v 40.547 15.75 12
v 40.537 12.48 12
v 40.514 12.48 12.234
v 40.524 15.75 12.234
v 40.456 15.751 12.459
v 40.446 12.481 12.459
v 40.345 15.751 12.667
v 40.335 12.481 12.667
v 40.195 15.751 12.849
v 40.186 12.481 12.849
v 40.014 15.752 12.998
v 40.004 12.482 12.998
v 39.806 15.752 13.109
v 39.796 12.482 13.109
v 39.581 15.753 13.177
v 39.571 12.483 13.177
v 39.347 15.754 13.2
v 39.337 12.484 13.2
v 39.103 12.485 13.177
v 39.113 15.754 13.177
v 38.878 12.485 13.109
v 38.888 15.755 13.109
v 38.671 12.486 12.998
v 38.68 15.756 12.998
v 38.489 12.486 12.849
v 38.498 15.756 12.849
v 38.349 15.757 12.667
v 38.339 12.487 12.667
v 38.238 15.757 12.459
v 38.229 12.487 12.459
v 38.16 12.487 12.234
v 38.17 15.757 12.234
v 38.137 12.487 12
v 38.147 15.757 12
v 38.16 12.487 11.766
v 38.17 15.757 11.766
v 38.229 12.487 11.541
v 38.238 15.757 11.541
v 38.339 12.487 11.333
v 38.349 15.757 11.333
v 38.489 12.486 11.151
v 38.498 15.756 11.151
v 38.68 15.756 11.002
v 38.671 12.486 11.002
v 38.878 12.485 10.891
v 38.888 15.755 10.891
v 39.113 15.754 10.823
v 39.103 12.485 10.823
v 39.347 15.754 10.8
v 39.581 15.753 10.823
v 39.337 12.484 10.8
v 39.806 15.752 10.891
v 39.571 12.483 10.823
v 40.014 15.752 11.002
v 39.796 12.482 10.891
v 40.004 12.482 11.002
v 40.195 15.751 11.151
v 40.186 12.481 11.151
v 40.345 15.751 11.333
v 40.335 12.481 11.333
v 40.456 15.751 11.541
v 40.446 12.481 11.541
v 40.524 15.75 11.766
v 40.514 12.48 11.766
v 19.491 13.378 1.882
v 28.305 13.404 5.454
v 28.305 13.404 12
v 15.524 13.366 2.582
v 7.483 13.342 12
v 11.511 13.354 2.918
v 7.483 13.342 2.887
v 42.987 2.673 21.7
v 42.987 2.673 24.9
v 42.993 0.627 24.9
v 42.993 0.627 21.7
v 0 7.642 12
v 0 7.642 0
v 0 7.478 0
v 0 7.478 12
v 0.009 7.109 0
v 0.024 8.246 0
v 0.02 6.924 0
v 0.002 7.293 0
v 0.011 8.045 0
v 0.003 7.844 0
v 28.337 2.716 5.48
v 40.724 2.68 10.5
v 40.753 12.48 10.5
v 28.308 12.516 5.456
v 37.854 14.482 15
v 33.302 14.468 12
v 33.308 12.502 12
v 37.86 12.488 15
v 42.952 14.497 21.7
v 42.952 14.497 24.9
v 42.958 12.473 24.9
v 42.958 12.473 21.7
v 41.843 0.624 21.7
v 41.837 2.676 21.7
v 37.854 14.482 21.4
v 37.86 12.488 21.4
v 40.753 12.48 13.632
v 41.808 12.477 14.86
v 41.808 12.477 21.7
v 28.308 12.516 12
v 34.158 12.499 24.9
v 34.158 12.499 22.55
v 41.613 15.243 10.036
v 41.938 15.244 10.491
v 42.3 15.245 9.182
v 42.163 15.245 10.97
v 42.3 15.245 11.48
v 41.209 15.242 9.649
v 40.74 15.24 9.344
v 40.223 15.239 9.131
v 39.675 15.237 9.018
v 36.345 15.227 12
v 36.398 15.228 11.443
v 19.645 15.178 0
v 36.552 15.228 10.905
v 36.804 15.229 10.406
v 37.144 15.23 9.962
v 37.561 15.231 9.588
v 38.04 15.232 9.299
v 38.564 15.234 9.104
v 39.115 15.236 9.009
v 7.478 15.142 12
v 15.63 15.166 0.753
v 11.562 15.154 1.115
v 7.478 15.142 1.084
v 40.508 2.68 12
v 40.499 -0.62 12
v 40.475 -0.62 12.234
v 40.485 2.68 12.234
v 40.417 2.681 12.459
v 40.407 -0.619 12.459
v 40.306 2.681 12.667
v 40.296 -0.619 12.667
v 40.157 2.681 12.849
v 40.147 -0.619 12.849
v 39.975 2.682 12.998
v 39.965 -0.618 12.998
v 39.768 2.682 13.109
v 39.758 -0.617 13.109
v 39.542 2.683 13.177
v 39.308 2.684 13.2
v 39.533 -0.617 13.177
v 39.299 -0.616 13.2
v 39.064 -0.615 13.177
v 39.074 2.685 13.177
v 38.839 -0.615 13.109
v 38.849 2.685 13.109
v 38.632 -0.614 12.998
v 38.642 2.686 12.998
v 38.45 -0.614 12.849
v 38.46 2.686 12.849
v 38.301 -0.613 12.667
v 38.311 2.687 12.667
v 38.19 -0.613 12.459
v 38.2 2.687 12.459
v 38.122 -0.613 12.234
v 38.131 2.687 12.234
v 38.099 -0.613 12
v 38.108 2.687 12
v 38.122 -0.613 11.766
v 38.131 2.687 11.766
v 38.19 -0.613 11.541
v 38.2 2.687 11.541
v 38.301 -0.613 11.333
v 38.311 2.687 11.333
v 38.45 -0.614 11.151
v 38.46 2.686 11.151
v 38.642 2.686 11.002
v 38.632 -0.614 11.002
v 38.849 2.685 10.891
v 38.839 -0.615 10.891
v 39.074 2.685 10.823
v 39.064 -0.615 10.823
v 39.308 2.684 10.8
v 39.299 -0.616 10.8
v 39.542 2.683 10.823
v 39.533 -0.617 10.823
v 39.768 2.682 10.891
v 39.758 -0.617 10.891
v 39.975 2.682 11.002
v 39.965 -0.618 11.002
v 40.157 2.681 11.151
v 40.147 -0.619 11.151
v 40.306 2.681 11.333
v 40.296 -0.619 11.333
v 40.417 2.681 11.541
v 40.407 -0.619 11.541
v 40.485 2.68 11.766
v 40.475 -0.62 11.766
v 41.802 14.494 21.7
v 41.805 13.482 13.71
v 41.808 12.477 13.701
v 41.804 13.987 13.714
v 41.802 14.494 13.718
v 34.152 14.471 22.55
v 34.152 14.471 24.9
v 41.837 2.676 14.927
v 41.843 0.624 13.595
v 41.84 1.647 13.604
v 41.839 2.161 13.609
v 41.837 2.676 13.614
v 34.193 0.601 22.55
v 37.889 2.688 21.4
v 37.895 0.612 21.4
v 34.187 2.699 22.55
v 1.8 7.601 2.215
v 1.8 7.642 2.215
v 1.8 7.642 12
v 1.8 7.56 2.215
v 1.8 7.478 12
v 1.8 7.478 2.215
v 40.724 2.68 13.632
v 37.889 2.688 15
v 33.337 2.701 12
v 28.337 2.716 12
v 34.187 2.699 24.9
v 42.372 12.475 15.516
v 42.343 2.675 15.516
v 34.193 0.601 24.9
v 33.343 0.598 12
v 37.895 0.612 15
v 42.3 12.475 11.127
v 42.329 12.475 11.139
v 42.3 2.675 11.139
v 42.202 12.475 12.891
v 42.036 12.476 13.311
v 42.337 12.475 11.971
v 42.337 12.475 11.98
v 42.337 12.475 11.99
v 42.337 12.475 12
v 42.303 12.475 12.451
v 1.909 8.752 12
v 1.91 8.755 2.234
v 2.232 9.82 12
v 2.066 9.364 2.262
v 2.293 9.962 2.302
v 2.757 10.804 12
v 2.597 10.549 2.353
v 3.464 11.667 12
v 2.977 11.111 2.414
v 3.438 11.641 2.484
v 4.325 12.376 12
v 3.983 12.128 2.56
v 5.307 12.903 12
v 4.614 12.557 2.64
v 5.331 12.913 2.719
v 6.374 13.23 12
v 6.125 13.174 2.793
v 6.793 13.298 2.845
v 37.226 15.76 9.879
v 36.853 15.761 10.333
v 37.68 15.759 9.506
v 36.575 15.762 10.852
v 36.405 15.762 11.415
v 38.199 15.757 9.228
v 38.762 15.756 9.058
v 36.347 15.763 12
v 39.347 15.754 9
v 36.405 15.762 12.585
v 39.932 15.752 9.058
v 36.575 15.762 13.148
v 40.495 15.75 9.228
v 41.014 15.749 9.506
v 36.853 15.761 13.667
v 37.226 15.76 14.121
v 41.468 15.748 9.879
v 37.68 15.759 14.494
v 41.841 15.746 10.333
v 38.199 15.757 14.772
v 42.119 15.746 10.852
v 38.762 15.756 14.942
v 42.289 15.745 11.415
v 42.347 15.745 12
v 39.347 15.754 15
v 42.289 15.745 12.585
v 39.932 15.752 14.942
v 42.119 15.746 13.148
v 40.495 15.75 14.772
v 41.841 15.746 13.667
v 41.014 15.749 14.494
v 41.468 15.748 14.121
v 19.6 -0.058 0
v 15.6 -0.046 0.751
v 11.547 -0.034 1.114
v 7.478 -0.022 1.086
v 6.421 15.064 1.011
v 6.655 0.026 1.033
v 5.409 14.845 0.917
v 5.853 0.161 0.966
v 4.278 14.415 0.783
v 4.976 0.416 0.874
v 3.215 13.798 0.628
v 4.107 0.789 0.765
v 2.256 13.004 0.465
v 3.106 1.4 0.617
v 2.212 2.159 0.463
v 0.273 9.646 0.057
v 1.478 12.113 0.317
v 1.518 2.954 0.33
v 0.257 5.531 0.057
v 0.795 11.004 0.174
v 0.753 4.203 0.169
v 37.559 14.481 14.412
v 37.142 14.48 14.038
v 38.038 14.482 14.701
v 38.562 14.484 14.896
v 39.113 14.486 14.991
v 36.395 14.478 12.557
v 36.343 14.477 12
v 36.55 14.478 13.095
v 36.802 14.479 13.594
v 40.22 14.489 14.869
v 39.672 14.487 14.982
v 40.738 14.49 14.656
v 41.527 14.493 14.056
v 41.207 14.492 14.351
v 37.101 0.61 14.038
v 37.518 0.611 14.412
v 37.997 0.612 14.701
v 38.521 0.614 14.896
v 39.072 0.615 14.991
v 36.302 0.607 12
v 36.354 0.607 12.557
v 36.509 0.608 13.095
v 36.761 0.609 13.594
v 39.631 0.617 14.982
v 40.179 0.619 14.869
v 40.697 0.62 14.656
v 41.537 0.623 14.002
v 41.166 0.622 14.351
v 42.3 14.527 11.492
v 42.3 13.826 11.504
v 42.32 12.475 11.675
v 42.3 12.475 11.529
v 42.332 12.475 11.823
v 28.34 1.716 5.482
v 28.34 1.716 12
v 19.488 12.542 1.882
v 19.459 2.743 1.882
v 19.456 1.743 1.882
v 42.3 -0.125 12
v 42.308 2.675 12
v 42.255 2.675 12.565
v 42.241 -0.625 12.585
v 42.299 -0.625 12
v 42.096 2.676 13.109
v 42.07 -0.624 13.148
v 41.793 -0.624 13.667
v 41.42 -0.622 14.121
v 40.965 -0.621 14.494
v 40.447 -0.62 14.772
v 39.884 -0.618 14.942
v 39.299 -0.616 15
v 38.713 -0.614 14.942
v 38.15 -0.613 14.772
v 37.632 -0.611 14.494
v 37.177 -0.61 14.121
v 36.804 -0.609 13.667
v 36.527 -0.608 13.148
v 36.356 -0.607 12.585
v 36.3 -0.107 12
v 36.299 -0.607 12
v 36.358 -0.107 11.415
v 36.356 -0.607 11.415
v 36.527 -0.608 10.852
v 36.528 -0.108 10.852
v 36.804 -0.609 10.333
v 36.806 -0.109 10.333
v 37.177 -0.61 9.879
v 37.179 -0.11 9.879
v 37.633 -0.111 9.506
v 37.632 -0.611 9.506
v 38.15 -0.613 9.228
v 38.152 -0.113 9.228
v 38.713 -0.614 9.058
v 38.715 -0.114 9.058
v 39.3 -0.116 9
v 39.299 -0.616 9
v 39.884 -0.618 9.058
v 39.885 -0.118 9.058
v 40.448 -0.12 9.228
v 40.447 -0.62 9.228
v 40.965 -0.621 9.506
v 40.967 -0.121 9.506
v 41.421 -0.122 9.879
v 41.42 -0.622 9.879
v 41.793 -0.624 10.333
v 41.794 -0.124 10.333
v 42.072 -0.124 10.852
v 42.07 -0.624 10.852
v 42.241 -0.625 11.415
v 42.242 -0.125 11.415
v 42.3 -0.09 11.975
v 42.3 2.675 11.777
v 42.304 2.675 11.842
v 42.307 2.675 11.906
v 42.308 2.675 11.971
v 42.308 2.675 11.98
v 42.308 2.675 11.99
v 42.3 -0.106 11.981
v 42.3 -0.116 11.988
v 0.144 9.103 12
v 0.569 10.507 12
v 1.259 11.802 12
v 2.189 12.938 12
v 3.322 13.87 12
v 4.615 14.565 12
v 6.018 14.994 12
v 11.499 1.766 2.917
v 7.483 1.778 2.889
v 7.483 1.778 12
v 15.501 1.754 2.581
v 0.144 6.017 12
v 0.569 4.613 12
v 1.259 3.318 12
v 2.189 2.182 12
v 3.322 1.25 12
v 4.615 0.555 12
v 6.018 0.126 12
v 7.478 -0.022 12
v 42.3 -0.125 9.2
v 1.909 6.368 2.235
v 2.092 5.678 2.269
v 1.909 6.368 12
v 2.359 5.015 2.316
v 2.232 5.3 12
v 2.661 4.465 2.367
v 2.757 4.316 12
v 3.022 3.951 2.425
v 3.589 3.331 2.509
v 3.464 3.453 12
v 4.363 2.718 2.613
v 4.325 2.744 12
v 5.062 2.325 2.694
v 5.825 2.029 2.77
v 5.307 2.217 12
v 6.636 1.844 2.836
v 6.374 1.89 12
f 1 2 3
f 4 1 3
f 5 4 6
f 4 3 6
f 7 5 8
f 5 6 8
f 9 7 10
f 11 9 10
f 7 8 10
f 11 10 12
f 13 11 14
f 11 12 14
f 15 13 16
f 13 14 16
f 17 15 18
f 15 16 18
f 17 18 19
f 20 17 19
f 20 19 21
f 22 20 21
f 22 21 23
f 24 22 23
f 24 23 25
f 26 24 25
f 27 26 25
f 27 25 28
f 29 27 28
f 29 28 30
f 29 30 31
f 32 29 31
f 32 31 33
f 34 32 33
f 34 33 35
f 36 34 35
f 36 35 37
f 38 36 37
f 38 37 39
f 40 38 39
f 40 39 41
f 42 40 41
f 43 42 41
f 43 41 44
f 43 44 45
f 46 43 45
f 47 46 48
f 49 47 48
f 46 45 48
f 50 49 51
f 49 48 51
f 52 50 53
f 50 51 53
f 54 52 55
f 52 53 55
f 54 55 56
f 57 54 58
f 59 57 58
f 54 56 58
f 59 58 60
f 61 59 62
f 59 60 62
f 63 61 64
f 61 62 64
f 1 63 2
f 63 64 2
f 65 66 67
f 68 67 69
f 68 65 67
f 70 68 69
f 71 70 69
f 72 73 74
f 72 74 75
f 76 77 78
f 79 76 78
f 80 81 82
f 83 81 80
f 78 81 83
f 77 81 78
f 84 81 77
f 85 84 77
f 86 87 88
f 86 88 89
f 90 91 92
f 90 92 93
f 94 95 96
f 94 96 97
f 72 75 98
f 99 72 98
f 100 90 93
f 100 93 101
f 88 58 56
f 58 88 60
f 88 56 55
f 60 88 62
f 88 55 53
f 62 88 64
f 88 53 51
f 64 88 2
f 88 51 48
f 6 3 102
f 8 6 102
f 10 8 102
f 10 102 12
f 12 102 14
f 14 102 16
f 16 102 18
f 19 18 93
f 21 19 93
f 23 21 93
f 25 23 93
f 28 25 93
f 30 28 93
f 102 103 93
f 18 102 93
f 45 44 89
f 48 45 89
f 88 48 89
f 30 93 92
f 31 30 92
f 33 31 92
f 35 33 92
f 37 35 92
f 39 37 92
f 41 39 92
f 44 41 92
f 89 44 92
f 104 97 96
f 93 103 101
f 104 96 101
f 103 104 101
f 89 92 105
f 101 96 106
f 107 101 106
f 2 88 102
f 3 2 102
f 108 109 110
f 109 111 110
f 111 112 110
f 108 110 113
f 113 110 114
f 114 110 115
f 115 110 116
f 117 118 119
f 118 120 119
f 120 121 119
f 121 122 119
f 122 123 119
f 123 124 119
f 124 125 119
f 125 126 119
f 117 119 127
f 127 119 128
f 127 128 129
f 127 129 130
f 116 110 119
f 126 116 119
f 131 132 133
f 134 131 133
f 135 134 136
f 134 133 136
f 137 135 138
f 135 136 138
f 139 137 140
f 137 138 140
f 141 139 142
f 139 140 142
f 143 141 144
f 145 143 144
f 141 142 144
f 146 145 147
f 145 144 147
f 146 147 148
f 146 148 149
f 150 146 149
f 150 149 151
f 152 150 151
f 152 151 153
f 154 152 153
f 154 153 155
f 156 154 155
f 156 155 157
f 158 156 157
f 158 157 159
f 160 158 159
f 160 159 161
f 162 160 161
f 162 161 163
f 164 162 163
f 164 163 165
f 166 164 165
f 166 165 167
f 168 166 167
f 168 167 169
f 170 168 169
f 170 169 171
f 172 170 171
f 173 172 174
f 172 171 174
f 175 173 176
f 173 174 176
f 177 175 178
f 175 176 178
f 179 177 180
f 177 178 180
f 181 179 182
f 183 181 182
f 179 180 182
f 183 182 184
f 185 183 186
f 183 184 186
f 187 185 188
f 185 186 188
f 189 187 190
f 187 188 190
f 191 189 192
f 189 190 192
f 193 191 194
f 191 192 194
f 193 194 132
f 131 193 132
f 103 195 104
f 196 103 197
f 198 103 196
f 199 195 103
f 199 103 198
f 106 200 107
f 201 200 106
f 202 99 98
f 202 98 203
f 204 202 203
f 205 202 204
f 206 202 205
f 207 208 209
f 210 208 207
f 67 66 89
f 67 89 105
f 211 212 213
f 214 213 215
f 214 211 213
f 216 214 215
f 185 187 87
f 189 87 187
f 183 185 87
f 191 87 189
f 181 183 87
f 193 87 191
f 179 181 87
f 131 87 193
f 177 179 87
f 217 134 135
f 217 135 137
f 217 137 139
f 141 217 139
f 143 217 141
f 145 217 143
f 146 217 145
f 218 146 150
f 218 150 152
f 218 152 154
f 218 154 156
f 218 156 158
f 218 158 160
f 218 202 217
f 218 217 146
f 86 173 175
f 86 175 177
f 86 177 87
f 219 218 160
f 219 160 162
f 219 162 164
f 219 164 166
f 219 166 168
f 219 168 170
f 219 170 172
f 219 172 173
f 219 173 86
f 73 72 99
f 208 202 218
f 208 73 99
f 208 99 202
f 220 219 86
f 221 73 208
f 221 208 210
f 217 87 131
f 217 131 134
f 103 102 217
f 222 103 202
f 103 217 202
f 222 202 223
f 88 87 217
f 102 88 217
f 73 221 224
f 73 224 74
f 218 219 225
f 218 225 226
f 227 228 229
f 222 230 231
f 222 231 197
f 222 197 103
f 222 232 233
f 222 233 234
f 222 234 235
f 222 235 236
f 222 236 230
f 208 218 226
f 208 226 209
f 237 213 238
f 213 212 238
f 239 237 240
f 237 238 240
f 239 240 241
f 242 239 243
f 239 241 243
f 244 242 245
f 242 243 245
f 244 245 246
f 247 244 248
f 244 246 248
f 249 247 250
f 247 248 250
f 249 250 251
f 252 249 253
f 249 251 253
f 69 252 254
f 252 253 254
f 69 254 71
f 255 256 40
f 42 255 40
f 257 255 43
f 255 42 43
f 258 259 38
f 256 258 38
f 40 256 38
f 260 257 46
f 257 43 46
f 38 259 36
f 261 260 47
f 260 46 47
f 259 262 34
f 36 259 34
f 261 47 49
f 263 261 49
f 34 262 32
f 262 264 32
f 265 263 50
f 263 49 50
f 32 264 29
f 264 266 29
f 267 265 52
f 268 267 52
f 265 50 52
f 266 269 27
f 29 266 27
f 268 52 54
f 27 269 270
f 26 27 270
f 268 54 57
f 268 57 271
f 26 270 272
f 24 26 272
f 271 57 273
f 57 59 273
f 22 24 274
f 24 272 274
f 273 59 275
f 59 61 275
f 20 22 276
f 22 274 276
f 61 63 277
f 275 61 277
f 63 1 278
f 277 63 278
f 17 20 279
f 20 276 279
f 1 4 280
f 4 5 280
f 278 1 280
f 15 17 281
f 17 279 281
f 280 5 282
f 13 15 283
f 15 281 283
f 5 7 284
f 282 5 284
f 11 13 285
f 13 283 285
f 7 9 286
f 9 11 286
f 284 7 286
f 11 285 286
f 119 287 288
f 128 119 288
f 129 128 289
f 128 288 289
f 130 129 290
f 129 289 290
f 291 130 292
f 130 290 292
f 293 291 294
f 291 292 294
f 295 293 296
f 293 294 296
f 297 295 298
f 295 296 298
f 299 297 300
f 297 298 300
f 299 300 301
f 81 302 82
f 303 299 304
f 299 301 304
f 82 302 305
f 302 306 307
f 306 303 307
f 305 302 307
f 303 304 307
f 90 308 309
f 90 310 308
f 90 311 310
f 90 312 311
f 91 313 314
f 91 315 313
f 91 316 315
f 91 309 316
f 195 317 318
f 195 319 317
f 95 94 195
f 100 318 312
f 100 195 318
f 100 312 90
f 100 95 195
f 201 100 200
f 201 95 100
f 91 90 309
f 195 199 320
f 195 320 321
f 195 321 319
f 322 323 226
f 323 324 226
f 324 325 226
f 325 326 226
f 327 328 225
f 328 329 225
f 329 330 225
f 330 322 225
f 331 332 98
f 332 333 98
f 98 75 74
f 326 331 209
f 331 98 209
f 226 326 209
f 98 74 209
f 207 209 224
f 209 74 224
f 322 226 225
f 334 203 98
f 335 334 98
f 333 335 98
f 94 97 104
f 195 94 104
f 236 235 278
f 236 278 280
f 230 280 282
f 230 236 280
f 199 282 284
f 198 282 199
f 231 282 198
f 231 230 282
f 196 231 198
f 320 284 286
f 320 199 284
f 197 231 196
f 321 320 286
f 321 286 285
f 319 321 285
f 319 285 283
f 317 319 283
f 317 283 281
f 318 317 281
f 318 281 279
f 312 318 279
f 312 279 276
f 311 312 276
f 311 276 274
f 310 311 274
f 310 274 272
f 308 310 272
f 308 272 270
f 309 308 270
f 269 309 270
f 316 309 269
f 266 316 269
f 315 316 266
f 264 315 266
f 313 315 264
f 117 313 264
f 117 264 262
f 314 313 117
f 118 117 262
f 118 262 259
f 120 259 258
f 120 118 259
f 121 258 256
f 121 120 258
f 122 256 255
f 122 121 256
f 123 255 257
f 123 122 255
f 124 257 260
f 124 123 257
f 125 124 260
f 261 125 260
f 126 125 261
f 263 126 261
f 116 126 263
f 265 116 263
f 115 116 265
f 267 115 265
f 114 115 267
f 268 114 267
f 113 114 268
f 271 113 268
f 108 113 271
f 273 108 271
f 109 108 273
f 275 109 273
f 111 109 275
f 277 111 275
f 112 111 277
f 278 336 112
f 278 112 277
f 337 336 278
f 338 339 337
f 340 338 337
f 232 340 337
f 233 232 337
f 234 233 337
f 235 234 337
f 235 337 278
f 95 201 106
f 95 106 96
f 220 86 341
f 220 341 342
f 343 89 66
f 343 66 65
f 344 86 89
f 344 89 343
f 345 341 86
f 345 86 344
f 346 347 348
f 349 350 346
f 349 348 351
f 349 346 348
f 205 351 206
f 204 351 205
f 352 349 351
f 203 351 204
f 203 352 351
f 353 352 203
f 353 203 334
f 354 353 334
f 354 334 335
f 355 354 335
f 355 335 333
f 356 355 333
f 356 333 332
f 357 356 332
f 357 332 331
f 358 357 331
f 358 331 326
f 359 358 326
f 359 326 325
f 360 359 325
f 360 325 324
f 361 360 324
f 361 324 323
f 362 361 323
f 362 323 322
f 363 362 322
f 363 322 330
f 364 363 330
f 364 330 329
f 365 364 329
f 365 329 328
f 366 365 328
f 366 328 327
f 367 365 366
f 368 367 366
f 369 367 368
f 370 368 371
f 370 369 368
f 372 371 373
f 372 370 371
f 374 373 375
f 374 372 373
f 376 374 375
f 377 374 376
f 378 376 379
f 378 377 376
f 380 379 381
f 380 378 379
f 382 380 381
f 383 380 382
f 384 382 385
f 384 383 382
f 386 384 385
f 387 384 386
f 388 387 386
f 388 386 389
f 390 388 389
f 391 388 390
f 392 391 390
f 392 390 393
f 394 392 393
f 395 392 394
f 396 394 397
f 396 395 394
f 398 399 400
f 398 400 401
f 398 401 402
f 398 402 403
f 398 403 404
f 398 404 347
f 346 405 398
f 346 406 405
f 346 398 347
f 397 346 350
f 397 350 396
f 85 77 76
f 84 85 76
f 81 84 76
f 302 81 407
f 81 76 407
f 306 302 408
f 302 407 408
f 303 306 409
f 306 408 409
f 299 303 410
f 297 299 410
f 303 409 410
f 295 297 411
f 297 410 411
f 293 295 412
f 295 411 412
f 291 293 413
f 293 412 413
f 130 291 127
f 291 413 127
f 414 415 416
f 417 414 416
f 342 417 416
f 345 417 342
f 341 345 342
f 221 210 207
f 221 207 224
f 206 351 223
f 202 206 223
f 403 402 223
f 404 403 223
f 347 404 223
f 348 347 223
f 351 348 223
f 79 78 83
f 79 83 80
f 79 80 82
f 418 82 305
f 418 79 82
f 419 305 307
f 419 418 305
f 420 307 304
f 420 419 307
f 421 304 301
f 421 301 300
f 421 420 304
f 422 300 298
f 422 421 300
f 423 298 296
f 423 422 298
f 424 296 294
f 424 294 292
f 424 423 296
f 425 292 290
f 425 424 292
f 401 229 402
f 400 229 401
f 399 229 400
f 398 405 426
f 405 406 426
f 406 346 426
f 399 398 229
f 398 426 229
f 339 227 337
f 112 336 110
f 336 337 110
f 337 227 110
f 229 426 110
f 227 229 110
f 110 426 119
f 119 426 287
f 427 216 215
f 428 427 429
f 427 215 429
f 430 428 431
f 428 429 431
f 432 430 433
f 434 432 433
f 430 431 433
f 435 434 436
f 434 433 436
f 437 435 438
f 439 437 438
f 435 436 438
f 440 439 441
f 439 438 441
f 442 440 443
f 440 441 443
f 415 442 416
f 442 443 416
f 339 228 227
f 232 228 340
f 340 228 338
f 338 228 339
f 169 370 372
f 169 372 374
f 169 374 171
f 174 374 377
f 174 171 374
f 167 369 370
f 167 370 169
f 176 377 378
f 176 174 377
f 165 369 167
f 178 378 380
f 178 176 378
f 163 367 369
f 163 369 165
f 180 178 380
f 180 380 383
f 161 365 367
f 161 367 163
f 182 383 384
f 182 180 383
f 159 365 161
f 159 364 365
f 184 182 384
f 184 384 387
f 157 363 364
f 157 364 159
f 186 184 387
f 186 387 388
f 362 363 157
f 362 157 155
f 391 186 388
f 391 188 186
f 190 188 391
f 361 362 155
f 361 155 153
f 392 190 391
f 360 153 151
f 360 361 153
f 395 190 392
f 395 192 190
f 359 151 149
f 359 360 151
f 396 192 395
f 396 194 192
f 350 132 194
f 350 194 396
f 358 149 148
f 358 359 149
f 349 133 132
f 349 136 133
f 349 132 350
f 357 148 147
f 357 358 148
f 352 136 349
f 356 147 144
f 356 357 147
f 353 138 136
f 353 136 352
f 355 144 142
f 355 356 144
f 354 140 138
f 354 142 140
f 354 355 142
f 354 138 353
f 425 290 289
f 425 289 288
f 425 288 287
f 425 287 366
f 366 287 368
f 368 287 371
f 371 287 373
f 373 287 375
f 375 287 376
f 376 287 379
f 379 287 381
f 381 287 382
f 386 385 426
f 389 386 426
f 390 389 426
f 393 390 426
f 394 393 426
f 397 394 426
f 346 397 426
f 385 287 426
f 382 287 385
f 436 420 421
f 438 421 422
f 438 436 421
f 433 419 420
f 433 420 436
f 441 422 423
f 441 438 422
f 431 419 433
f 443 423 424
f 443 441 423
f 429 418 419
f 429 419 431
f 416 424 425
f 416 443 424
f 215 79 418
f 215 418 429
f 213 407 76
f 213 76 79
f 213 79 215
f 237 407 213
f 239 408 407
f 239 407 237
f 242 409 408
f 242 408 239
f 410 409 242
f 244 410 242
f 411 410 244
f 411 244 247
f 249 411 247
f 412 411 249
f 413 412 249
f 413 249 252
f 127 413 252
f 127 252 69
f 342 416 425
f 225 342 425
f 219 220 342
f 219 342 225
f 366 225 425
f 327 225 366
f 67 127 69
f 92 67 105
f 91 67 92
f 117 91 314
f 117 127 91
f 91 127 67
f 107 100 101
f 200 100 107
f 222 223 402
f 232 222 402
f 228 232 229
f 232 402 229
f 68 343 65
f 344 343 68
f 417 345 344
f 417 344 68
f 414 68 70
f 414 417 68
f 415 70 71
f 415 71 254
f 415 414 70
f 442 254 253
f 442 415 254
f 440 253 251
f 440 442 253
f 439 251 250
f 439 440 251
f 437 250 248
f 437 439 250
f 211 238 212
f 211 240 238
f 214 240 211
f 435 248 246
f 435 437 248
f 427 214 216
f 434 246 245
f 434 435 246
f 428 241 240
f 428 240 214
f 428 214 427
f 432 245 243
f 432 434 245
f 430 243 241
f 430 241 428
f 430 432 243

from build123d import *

# Parameters (mm, degrees)
F1_DEPTH  = 12
F3_DEPTH  = 25
F4_T      = -1.8
F5_R      = 5.7
F6_R      = 7.5
F8_R      = 3
F9_DEPTH  = 16.37
F10_R     = 1.2
F11_DEPTH = 16.3887303416
F14_DEPTH = 13.87
F17_DEPTH = 9.8
F19_DEPTH = 9.8


with BuildPart() as f1:
    # F0 (on Top) → F1 (new body)
    with BuildSketch(Plane.XY):
        Polygon((0, 15.12), (0, 0), (42.3, -0.125), (42.3, 15.245), align=None)
    extrude(amount=F1_DEPTH)

    # F2 (on face) → F3 (cut)
    with BuildSketch(Plane(origin=(0, 0, 0), x_dir=(0.9999956338, -0.0029550698, 0), z_dir=(-0.0029550698, -0.9999956338, 0))):
        Polygon((42.3001846923, 0), (42.3001846923, 9.2), (19.6, 0), align=None)
        with BuildLine():
            Line((0, 0), (19.6, 0))
            ThreePointArc((19.6, 0), (9.8, 1.15), (0, 0))
        make_face()
    extrude(amount=-F3_DEPTH, mode=Mode.SUBTRACT)

    # F4
    f4_openings = [f1.faces().sort_by_distance(p)[0] for p in [
        (21.207806, 7.56, 12),
    ]]
    offset(amount=F4_T, openings=f4_openings)

    # F5
    f5_edges = [f1.edges().sort_by_distance(p)[0] for p in [
        (1.8, 13.325311, 7.10578),
        (1.8, 1.794689, 7.108929),
    ]]
    fillet(f5_edges, radius=F5_R)

    # F6#2 (call 1 of 2: OpenCascade refuses the feature's edges together)
    f6_2_edges = [f1.edges().sort_by_distance(p)[0] for p in [
        (0, 0, 6),
    ]]
    fillet(f6_2_edges, radius=F6_R)

    # F6 (call 2 of 2)
    f6_edges = [f1.edges().sort_by_distance(p)[0] for p in [
        (0, 15.12, 6),
    ]]
    fillet(f6_edges, radius=F6_R)

    # F8 (on offset) → F9 (join)
    with BuildSketch(Plane(origin=(-0.0014775349, -0.4999978169, 0), x_dir=(0.9999956338, -0.0029550698, 0), z_dir=(-0.0029550698, -0.9999956338, 0))):
        with Locations((39.3001846923, 12)):
            Circle(F8_R)
    extrude(amount=-F9_DEPTH)

    # F10 (on face) → F11 (cut, through all)
    with BuildSketch(Plane(origin=(-0.0014775349, -0.4999978169, 0), x_dir=(0.9999956338, -0.0029550698, 0), z_dir=(-0.0029550698, -0.9999956338, 0))):
        with Locations((39.3001846923, 12)):
            Circle(F10_R)
    extrude(amount=-F11_DEPTH, mode=Mode.SUBTRACT)

    # F13 (on offset) → F14 (join)
    with BuildSketch(Plane(origin=(-0.0424641585, 14.3698712402, 0), x_dir=(-0.9999956338, -0.0029550698, 0), z_dir=(-0.0029550698, 0.9999956338, 0))):
        Polygon((-39.6163160442, 9.2177886928), (-28.3448653482, 5.1912576891), (-28.3448653482, 12), (-33.3448653482, 12), (-37.8970582696, 15), (-37.8970582696, 21.4), (-34.1948653482, 22.55), (-34.1948653482, 24.9), (-42.9948653482, 24.9), (-42.9948653482, 21.7), (-41.8448653482, 21.7), (-41.8448653482, 13.4442944811), (-36.9448653482, 13.4442944811), align=None)
    extrude(amount=-F14_DEPTH)

    # F16 (on offset) → F17 (cut)
    with BuildSketch(Plane(origin=(0.0082741956, 2.7999877746, 0), x_dir=(-0.9999956338, 0.0029550698, 0), z_dir=(0.0029550698, 0.9999956338, 0))):
        Polygon((-45.8104334942, 12.5648554603), (-19.4509569667, 1.8818065187), (-19.4509569667, 29.0965877719), (-45.8104334942, 29.0965877719), align=None)
    extrude(amount=F17_DEPTH, mode=Mode.SUBTRACT)

    # F18 (on face) → F19 (join, through all)
    with BuildSketch(Plane(origin=(0.0082741956, 2.7999877746, 0), x_dir=(-0.9999956338, 0.0029550698, 0), z_dir=(0.0029550698, 0.9999956338, 0))):
        Polygon((-42.3346940311, 15.5157536155), (-42.2919104606, 11.1388577274), (-40.7162009106, 10.5002493611), (-40.7162009106, 13.6316680383), align=None)
    extrude(amount=F19_DEPTH)


solid = f1.part
